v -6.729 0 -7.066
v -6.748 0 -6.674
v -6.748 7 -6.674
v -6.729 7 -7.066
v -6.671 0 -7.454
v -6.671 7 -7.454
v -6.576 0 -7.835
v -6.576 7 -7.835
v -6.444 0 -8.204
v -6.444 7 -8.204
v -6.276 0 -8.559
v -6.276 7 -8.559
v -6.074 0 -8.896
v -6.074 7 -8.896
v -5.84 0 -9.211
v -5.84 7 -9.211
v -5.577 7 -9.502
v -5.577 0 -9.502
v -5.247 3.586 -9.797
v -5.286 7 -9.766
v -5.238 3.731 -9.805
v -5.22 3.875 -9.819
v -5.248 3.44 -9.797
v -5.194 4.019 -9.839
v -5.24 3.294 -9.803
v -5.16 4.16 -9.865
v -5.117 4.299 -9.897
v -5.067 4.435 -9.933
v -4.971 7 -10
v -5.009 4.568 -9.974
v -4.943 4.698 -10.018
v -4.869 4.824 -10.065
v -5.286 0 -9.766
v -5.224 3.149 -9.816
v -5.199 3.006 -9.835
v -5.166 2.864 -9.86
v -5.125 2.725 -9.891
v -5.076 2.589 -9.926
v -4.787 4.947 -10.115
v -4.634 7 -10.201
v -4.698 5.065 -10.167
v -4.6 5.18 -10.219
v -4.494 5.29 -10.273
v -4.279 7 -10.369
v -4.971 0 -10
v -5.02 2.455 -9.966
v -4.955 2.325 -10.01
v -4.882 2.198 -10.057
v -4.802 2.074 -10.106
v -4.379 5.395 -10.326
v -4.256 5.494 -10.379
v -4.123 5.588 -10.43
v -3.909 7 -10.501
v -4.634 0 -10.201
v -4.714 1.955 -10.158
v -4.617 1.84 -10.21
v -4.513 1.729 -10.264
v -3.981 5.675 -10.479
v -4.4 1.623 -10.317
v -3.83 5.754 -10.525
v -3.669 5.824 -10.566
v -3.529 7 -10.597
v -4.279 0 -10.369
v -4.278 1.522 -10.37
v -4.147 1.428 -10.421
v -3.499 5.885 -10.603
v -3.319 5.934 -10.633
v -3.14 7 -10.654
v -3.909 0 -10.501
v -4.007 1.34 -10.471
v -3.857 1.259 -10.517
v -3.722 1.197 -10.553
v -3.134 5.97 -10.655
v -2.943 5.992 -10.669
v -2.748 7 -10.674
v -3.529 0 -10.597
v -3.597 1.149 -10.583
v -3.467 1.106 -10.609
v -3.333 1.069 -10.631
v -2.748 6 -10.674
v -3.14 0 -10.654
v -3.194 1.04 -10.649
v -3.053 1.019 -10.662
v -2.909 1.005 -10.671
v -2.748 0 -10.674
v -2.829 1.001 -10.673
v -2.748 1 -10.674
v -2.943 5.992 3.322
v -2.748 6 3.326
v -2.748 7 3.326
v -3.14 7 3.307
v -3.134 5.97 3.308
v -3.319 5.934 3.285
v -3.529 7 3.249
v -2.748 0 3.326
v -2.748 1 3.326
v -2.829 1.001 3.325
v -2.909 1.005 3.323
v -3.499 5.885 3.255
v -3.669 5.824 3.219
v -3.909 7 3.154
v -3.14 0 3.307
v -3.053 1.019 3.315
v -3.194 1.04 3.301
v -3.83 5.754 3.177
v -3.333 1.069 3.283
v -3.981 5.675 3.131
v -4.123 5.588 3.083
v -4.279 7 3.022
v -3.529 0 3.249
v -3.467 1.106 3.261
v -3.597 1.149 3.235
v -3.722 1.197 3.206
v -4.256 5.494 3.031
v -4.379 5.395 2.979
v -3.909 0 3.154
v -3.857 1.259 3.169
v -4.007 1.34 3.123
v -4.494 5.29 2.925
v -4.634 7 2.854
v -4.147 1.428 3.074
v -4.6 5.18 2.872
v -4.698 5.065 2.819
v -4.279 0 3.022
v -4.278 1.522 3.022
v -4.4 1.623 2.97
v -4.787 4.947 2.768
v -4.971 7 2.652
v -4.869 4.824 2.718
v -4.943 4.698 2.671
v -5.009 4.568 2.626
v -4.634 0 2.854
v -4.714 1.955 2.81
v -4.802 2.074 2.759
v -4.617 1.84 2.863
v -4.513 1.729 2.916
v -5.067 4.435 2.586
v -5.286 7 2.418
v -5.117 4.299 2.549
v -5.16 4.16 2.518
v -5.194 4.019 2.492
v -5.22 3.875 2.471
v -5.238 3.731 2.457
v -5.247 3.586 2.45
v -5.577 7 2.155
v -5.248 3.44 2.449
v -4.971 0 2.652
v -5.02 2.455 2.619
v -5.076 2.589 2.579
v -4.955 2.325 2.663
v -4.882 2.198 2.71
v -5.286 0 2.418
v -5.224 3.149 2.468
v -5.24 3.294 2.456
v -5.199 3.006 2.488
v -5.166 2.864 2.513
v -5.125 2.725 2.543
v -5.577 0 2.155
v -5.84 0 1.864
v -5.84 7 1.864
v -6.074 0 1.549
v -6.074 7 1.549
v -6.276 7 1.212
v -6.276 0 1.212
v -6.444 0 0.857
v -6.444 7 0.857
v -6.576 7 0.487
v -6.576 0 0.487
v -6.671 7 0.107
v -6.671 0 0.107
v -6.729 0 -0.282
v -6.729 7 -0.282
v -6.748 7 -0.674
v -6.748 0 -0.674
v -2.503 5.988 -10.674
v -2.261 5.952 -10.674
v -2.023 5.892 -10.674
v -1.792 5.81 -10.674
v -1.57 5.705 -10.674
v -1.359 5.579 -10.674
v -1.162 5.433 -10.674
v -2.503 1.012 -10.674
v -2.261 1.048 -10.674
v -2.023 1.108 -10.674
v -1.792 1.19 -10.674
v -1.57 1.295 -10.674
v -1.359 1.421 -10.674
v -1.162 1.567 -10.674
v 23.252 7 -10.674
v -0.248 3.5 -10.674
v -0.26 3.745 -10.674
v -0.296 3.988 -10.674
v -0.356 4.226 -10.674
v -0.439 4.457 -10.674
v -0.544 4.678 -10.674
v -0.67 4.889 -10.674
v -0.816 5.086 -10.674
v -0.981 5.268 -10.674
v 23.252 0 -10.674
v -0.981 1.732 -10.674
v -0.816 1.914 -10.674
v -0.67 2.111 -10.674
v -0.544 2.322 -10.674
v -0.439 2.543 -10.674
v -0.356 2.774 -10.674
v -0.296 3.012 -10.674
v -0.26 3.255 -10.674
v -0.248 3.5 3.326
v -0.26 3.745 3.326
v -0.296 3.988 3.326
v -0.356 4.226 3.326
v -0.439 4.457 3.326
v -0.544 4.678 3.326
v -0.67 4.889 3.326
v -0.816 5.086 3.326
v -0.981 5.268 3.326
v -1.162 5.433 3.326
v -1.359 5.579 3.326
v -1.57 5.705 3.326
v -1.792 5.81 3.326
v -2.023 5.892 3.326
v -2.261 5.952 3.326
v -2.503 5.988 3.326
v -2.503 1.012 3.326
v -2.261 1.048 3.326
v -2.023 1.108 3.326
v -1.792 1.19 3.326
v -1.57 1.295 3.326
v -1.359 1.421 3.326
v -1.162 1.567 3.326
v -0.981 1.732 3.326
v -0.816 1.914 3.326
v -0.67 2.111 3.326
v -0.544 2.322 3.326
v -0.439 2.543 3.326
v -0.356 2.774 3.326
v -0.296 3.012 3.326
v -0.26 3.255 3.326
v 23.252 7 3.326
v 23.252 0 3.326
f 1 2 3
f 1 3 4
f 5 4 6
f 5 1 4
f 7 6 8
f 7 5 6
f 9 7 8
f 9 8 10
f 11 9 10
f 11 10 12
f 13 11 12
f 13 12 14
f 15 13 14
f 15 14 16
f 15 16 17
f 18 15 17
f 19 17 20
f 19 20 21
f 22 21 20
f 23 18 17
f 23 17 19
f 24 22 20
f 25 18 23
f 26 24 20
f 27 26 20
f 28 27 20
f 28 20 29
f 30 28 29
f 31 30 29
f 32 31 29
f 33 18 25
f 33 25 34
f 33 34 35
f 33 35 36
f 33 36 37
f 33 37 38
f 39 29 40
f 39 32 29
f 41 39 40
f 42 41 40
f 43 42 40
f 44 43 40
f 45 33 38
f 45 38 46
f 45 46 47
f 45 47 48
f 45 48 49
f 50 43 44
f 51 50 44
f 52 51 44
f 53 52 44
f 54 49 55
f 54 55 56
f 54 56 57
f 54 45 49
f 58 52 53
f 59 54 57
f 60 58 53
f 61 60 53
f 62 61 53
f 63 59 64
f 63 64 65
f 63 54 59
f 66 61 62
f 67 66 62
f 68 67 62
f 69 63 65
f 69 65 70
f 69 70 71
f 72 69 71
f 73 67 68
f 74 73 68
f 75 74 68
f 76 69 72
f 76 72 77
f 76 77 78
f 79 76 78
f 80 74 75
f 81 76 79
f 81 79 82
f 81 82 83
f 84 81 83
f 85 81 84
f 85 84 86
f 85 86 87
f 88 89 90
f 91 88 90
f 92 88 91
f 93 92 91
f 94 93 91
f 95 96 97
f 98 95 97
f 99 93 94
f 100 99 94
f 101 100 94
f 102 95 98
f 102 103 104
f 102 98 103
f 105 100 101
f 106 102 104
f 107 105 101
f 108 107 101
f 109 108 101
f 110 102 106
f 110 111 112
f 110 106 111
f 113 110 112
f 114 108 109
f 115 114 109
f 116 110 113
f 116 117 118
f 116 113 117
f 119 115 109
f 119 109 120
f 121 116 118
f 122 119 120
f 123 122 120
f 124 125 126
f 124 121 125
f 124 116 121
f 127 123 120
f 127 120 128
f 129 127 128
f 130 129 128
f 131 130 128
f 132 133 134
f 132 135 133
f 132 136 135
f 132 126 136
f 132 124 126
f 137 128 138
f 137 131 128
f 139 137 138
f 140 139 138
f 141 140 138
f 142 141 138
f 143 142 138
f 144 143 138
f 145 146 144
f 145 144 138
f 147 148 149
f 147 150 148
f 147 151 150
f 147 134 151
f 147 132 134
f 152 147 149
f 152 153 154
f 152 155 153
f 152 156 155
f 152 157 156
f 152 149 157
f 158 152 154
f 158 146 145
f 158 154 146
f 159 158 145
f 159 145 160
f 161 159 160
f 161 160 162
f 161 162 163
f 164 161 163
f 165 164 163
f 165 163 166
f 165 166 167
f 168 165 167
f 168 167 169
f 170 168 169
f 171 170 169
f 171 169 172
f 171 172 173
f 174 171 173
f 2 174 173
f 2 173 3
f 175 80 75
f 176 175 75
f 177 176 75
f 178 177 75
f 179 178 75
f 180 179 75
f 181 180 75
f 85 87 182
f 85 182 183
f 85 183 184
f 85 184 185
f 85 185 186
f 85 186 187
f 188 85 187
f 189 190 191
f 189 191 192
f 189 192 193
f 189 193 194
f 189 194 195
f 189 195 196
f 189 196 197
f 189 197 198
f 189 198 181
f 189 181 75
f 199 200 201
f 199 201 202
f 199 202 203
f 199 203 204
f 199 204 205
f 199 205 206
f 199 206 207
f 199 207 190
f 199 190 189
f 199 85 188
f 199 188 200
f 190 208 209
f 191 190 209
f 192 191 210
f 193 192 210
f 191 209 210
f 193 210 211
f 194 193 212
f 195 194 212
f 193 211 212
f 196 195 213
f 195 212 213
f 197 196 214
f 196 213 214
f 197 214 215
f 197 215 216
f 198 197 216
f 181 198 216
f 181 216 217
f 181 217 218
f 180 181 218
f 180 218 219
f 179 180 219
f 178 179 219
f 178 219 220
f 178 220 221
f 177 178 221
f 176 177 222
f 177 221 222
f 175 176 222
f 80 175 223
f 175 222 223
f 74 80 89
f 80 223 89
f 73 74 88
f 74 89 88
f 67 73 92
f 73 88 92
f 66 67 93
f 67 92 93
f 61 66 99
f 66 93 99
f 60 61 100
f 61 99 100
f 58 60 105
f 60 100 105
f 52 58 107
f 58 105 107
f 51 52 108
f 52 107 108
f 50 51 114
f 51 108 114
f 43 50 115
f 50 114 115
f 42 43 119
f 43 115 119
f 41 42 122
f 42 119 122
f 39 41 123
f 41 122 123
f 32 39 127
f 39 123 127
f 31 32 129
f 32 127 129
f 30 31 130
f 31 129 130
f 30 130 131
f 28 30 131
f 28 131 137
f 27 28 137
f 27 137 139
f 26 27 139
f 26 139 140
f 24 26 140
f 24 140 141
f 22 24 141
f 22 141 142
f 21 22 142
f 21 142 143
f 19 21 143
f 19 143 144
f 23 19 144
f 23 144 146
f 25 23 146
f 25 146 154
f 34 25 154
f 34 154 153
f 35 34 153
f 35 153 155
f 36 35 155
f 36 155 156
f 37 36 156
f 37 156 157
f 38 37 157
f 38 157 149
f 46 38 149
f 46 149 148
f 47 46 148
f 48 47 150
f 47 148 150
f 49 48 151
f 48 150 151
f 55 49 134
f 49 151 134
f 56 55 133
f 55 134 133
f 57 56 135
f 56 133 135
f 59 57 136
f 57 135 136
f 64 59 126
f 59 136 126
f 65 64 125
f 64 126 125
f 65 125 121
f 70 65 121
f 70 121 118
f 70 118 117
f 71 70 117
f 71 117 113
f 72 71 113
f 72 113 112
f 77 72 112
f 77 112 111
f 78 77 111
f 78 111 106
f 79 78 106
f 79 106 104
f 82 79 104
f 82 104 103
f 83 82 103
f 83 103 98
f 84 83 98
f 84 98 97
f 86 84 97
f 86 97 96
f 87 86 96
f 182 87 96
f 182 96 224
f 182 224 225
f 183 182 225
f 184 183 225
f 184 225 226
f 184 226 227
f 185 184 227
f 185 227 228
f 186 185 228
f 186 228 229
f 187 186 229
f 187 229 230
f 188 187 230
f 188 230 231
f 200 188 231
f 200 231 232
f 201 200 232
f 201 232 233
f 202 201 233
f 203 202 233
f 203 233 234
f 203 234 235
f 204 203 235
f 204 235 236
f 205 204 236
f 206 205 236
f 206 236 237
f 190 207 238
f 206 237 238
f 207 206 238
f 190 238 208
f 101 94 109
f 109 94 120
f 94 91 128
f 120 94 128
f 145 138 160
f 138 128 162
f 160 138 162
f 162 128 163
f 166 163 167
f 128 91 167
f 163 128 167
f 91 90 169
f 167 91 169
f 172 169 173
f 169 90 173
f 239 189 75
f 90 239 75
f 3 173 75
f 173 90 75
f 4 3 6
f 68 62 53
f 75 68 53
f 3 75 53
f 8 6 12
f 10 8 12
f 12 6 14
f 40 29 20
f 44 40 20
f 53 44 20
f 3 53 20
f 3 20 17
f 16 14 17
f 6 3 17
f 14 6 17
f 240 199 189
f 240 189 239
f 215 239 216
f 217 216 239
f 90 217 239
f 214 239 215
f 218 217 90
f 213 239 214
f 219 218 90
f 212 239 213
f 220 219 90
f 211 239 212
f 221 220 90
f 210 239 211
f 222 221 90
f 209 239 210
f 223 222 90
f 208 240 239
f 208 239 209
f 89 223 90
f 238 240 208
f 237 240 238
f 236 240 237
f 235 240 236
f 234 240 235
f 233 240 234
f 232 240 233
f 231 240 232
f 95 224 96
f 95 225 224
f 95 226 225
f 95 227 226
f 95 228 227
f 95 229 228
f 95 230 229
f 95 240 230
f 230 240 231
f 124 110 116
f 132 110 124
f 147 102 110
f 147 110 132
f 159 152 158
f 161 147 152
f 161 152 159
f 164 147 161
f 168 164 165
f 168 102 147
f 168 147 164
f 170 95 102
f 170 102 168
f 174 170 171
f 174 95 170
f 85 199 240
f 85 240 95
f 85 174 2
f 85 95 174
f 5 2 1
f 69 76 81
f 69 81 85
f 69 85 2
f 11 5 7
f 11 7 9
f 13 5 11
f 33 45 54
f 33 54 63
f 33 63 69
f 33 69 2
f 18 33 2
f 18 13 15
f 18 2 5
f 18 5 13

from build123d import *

# Parameters (mm, degrees)
BOSS_EXTRUDE1_DEPTH = 7
SKETCH3_R           = 2.5
CUT_EXTRUDE1_DEPTH  = 14


with BuildPart() as part:
    # Sketch2 → Boss-Extrude1 (new body)
    with BuildSketch(Plane(origin=(0, 0, 0), x_dir=(1, 0, 0), z_dir=(0, 1, 0))):
        with BuildLine():
            Line((-2.748329621, 10.673719376), (23.251670379, 10.673719376))
            Line((23.251670379, 10.673719376), (23.251670379, -3.326280624))
            Line((23.251670379, -3.326280624), (-2.748329621, -3.326280624))
            ThreePointArc((-2.748329621, -3.326280624), (-5.576756746, -2.154707748), (-6.748329621, 0.673719376))
            Line((-6.748329621, 0.673719376), (-6.748329621, 6.673719376))
            ThreePointArc((-6.748329621, 6.673719376), (-5.576756746, 9.502146501), (-2.748329621, 10.673719376))
        make_face()
    extrude(amount=BOSS_EXTRUDE1_DEPTH)

    # Sketch3 → Cut-Extrude1 (cut)
    with BuildSketch(Plane.XY.offset(3.326280624)):
        with Locations((-2.748329621, 3.5)):
            Circle(SKETCH3_R)
    extrude(amount=-CUT_EXTRUDE1_DEPTH, mode=Mode.SUBTRACT)


solid = part.part
